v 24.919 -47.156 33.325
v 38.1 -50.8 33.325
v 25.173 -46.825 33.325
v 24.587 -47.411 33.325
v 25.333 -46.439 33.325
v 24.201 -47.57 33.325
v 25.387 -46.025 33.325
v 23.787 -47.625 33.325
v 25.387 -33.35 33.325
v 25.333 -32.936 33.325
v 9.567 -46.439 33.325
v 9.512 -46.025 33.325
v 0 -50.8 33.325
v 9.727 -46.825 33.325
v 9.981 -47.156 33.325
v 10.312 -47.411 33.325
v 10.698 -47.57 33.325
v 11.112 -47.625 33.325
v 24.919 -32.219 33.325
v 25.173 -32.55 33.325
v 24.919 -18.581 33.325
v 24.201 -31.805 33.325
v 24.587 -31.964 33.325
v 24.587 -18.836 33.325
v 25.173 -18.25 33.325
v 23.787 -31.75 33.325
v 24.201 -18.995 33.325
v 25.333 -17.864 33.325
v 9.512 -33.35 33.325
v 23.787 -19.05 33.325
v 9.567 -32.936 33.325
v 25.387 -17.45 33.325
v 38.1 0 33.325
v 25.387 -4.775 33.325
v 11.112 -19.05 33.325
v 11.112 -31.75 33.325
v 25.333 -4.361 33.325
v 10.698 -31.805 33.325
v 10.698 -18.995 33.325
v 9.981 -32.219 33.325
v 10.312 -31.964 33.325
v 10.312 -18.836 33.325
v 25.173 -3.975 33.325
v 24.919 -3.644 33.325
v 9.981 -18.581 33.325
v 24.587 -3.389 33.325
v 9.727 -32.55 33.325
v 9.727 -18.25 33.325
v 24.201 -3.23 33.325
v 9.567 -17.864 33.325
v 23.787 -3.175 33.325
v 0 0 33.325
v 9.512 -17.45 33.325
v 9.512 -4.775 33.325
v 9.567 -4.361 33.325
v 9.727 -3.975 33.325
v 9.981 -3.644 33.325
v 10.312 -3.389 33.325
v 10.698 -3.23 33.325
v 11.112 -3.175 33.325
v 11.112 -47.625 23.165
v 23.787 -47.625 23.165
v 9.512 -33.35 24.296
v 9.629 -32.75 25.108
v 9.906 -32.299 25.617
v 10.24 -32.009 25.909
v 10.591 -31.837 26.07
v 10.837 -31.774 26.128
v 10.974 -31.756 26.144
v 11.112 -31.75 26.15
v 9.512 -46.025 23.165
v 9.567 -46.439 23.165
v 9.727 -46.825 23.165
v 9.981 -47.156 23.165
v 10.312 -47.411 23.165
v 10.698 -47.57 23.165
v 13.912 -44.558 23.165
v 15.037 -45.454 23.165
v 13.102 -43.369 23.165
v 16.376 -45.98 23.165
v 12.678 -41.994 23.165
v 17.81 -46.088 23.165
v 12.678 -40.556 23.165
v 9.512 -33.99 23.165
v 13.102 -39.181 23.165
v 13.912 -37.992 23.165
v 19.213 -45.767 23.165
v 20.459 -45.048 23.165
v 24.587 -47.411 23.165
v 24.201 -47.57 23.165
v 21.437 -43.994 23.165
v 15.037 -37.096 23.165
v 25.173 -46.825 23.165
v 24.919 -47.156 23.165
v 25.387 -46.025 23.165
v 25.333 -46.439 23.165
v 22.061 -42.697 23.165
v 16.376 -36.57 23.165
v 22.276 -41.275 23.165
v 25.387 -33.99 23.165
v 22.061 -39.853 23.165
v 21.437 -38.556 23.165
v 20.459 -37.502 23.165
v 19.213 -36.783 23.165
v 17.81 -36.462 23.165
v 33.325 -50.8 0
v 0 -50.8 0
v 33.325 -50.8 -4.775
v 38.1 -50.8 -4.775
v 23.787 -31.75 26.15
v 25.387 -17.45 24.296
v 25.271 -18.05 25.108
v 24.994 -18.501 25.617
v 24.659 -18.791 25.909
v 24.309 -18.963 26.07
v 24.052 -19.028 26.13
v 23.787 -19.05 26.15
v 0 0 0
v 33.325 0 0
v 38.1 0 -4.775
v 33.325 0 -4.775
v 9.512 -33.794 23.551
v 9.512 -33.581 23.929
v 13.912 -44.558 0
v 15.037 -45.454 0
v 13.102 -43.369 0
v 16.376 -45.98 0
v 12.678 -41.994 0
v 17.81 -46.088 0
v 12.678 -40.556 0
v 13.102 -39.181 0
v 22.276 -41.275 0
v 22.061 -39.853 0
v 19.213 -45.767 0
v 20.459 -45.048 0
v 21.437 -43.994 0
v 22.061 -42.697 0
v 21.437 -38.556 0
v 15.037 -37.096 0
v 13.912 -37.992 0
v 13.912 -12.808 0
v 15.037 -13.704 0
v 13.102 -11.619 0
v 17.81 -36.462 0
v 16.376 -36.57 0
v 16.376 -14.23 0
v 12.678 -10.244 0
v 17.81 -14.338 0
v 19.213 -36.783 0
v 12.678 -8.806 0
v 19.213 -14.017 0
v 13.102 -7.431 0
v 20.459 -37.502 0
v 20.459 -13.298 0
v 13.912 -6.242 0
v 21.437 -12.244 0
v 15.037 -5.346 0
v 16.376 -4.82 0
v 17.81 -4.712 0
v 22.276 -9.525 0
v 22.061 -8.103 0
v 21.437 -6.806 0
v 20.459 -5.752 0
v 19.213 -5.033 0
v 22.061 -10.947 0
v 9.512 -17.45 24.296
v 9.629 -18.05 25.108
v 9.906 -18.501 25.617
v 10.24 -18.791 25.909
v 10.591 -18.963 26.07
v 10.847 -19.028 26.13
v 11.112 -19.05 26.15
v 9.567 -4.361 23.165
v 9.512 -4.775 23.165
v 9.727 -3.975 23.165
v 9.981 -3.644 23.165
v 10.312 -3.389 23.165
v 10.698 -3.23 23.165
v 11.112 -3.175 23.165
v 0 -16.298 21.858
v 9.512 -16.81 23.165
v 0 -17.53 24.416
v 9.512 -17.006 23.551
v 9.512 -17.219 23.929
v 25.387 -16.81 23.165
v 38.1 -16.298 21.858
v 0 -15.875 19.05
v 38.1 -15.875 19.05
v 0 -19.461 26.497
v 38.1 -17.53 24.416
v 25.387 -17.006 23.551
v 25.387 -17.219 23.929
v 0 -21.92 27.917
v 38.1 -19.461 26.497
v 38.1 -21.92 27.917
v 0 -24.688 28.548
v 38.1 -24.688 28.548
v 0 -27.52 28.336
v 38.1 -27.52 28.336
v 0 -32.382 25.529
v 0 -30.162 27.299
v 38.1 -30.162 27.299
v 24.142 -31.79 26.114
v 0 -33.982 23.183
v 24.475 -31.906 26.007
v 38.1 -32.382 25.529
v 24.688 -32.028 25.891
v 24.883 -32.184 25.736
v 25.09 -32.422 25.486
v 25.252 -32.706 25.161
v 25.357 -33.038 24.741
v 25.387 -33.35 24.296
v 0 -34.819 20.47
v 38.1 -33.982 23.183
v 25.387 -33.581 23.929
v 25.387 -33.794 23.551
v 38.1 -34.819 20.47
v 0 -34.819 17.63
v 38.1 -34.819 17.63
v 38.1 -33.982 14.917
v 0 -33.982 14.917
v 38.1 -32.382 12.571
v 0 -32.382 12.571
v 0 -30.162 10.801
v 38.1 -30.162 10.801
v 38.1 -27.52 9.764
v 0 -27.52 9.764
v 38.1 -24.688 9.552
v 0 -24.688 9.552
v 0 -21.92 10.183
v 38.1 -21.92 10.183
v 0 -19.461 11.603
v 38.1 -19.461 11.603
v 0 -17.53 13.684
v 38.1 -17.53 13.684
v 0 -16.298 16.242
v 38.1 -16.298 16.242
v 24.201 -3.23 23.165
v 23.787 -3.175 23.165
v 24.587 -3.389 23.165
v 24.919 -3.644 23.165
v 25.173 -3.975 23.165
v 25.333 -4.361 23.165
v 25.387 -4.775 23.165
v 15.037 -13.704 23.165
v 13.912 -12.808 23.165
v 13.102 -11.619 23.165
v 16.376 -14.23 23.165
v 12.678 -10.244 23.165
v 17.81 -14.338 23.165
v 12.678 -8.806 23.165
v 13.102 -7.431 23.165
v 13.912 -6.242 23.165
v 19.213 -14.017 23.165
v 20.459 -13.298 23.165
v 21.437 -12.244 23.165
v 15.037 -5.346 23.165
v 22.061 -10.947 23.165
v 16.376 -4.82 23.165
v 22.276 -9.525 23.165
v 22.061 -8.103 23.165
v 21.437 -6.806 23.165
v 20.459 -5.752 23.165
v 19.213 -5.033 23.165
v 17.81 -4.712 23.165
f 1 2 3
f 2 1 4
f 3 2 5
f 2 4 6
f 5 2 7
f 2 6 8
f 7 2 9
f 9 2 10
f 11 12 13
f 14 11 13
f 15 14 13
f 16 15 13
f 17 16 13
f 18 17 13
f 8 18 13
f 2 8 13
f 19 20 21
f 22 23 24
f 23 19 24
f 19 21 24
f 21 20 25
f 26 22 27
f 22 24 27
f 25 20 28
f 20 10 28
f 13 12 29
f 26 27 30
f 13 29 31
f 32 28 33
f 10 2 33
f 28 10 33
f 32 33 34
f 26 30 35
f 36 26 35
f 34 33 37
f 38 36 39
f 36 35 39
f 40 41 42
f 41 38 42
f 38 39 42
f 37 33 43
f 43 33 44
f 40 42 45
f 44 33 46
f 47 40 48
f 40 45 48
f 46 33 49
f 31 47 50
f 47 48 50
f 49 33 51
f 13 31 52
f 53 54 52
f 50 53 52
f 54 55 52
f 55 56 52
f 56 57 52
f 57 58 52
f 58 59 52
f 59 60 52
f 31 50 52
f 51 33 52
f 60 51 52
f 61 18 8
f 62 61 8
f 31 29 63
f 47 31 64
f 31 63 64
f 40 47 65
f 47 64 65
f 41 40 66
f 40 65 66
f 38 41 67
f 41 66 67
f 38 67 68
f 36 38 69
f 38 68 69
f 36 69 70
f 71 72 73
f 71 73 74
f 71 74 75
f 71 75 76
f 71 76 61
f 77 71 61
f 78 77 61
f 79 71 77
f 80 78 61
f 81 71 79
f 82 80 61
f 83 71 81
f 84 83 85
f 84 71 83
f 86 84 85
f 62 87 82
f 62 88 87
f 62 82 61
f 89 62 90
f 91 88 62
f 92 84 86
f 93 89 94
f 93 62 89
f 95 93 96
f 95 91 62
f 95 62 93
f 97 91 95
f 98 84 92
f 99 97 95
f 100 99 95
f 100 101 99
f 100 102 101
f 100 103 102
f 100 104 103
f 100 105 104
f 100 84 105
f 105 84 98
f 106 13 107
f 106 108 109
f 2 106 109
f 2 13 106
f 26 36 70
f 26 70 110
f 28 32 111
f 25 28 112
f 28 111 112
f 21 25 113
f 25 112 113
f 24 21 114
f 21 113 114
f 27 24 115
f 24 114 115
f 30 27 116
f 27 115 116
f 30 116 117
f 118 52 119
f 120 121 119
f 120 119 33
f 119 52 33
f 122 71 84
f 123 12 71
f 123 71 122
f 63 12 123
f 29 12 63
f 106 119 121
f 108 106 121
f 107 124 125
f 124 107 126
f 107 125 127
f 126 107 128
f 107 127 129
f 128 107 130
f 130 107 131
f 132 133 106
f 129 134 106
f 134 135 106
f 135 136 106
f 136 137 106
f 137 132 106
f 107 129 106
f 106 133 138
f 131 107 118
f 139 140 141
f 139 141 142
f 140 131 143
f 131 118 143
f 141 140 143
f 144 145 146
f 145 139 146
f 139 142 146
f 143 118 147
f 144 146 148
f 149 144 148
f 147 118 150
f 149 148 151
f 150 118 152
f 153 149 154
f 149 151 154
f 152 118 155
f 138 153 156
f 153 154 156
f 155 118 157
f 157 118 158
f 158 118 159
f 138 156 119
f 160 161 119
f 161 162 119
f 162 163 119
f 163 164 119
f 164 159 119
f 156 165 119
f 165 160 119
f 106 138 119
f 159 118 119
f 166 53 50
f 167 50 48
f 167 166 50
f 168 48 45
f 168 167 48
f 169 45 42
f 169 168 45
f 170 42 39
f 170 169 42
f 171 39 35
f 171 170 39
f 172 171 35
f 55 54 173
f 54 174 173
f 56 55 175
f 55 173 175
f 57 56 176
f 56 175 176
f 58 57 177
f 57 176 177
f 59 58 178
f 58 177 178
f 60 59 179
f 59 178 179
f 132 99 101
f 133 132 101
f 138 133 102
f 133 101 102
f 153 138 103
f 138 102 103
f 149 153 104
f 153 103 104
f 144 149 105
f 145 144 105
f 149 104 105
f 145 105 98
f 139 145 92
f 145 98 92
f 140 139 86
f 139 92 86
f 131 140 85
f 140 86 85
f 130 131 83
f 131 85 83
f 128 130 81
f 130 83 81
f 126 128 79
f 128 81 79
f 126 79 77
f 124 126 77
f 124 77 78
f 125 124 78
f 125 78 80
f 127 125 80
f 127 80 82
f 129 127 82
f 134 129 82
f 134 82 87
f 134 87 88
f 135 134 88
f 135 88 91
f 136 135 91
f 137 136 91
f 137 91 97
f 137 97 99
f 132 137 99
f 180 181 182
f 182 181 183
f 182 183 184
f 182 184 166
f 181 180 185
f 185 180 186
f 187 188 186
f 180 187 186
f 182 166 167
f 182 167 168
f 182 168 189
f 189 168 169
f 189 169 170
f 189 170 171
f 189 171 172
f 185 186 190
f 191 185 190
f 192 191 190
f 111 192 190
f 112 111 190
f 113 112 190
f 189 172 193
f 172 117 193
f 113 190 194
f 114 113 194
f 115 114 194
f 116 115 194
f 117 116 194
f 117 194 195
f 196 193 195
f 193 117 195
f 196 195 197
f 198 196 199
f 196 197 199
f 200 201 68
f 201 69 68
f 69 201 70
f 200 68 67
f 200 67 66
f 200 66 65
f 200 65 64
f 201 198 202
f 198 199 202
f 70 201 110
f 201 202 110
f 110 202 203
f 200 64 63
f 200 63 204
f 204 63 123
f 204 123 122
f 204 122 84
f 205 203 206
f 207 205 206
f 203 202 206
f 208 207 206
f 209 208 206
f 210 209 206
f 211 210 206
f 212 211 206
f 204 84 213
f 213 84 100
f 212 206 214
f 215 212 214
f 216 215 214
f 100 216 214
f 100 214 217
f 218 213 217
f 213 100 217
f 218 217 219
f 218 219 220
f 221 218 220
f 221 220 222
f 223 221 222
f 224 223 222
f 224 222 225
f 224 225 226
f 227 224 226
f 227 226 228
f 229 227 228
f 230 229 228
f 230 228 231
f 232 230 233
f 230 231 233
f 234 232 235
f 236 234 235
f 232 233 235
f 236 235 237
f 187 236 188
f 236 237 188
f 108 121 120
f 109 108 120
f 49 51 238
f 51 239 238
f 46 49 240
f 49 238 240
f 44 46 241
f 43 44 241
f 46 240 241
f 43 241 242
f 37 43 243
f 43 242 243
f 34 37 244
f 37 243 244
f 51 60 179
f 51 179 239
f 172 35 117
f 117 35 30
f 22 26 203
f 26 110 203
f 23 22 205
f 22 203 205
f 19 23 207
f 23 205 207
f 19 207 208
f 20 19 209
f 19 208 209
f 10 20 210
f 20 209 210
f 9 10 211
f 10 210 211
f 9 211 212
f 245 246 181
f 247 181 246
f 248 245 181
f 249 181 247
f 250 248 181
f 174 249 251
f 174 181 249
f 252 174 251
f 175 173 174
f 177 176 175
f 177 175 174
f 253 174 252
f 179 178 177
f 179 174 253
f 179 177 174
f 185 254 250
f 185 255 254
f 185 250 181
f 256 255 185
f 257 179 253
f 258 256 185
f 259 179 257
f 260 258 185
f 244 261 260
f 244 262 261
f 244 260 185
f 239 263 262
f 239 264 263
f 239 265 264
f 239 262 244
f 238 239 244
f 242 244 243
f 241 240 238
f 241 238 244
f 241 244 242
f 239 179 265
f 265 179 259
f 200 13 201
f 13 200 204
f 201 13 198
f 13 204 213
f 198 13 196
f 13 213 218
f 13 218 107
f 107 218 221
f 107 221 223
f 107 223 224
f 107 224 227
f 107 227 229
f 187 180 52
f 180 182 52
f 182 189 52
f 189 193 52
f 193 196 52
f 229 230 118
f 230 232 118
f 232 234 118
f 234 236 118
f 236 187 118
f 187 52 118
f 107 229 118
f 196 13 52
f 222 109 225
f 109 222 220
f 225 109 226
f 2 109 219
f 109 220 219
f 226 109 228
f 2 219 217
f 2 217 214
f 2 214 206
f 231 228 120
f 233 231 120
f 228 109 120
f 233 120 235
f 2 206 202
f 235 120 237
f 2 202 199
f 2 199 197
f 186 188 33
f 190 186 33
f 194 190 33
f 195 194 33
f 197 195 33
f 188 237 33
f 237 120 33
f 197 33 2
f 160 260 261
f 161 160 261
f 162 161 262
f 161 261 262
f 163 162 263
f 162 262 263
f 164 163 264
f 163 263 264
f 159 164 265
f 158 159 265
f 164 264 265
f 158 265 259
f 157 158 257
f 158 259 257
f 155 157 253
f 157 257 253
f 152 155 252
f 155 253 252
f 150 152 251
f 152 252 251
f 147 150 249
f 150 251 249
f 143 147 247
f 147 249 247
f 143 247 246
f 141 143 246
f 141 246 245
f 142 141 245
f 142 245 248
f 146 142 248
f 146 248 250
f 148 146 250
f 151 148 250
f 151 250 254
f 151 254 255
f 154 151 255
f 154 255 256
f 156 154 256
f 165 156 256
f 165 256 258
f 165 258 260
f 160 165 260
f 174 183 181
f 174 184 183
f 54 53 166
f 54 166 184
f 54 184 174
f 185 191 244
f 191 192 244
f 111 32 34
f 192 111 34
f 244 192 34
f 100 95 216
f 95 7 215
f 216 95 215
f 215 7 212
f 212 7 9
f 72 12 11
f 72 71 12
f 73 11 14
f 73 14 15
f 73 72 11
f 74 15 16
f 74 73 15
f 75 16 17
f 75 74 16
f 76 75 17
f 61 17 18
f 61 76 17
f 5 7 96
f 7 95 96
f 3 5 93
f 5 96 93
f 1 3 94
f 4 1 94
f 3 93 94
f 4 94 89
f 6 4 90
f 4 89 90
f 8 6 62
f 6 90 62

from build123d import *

# Parameters (mm, degrees)
F1_DEPTH = 50.8
F2_R     = 9.525
F4_DEPTH = 38.101
F3_R     = 4.826
F5_DEPTH = 38.101
F3_W     = 15.875
F3_H     = 15.875
F8_DEPTH = 10.16
F9_R     = 1.6002


with BuildPart() as f1:
    # F0 (on Front) → F1 (new body)
    with BuildSketch(Plane.XZ):
        Polygon((0, 33.3248), (0, 0), (33.3248, 0), (33.3248, -4.7752), (38.1, -4.7752), (38.1, 33.3248), align=None)
    extrude(amount=F1_DEPTH)

    # F2 (on face) → F4 (cut, through all)
    with BuildSketch(Plane.YZ.offset(38.1)):
        with Locations((-25.4, 19.05)):
            Circle(F2_R)
    extrude(amount=-F4_DEPTH, mode=Mode.SUBTRACT)

    # F3 (on face) → F5 (cut, through all)
    with BuildSketch(Plane.XY.offset(33.3248)):
        with Locations((17.4498, -9.525)):
            Circle(F3_R)
        with Locations((17.4498, -41.275)):
            Circle(F3_R)
    extrude(amount=-F5_DEPTH, mode=Mode.SUBTRACT)

    # F3 (on face) → F8 (cut)
    with BuildSketch(Plane.XY.offset(33.3248)):
        with Locations((17.4498, -11.1125)):
            Rectangle(F3_W, F3_H)
        with Locations((17.4498, -9.525)):
            Circle(F3_R, mode=Mode.SUBTRACT)
        with Locations((17.4498, -39.6875)):
            Rectangle(F3_W, F3_H)
        with Locations((17.4498, -41.275)):
            Circle(F3_R, mode=Mode.SUBTRACT)
    extrude(amount=-F8_DEPTH, mode=Mode.SUBTRACT)

    # F9
    f9_edges = [f1.edges().sort_by_distance(p)[0] for p in [
        (9.5123, -47.625, 28.2448),
        (9.5123, -31.75, 29.737158),
        (9.5123, -3.175, 28.2448),
        (9.5123, -19.05, 29.737158),
        (25.3873, -19.05, 29.737158),
        (25.3873, -47.625, 28.2448),
        (25.3873, -31.75, 29.737158),
        (25.3873, -3.175, 28.2448),
    ]]
    fillet(f9_edges, radius=F9_R)


solid = f1.part
